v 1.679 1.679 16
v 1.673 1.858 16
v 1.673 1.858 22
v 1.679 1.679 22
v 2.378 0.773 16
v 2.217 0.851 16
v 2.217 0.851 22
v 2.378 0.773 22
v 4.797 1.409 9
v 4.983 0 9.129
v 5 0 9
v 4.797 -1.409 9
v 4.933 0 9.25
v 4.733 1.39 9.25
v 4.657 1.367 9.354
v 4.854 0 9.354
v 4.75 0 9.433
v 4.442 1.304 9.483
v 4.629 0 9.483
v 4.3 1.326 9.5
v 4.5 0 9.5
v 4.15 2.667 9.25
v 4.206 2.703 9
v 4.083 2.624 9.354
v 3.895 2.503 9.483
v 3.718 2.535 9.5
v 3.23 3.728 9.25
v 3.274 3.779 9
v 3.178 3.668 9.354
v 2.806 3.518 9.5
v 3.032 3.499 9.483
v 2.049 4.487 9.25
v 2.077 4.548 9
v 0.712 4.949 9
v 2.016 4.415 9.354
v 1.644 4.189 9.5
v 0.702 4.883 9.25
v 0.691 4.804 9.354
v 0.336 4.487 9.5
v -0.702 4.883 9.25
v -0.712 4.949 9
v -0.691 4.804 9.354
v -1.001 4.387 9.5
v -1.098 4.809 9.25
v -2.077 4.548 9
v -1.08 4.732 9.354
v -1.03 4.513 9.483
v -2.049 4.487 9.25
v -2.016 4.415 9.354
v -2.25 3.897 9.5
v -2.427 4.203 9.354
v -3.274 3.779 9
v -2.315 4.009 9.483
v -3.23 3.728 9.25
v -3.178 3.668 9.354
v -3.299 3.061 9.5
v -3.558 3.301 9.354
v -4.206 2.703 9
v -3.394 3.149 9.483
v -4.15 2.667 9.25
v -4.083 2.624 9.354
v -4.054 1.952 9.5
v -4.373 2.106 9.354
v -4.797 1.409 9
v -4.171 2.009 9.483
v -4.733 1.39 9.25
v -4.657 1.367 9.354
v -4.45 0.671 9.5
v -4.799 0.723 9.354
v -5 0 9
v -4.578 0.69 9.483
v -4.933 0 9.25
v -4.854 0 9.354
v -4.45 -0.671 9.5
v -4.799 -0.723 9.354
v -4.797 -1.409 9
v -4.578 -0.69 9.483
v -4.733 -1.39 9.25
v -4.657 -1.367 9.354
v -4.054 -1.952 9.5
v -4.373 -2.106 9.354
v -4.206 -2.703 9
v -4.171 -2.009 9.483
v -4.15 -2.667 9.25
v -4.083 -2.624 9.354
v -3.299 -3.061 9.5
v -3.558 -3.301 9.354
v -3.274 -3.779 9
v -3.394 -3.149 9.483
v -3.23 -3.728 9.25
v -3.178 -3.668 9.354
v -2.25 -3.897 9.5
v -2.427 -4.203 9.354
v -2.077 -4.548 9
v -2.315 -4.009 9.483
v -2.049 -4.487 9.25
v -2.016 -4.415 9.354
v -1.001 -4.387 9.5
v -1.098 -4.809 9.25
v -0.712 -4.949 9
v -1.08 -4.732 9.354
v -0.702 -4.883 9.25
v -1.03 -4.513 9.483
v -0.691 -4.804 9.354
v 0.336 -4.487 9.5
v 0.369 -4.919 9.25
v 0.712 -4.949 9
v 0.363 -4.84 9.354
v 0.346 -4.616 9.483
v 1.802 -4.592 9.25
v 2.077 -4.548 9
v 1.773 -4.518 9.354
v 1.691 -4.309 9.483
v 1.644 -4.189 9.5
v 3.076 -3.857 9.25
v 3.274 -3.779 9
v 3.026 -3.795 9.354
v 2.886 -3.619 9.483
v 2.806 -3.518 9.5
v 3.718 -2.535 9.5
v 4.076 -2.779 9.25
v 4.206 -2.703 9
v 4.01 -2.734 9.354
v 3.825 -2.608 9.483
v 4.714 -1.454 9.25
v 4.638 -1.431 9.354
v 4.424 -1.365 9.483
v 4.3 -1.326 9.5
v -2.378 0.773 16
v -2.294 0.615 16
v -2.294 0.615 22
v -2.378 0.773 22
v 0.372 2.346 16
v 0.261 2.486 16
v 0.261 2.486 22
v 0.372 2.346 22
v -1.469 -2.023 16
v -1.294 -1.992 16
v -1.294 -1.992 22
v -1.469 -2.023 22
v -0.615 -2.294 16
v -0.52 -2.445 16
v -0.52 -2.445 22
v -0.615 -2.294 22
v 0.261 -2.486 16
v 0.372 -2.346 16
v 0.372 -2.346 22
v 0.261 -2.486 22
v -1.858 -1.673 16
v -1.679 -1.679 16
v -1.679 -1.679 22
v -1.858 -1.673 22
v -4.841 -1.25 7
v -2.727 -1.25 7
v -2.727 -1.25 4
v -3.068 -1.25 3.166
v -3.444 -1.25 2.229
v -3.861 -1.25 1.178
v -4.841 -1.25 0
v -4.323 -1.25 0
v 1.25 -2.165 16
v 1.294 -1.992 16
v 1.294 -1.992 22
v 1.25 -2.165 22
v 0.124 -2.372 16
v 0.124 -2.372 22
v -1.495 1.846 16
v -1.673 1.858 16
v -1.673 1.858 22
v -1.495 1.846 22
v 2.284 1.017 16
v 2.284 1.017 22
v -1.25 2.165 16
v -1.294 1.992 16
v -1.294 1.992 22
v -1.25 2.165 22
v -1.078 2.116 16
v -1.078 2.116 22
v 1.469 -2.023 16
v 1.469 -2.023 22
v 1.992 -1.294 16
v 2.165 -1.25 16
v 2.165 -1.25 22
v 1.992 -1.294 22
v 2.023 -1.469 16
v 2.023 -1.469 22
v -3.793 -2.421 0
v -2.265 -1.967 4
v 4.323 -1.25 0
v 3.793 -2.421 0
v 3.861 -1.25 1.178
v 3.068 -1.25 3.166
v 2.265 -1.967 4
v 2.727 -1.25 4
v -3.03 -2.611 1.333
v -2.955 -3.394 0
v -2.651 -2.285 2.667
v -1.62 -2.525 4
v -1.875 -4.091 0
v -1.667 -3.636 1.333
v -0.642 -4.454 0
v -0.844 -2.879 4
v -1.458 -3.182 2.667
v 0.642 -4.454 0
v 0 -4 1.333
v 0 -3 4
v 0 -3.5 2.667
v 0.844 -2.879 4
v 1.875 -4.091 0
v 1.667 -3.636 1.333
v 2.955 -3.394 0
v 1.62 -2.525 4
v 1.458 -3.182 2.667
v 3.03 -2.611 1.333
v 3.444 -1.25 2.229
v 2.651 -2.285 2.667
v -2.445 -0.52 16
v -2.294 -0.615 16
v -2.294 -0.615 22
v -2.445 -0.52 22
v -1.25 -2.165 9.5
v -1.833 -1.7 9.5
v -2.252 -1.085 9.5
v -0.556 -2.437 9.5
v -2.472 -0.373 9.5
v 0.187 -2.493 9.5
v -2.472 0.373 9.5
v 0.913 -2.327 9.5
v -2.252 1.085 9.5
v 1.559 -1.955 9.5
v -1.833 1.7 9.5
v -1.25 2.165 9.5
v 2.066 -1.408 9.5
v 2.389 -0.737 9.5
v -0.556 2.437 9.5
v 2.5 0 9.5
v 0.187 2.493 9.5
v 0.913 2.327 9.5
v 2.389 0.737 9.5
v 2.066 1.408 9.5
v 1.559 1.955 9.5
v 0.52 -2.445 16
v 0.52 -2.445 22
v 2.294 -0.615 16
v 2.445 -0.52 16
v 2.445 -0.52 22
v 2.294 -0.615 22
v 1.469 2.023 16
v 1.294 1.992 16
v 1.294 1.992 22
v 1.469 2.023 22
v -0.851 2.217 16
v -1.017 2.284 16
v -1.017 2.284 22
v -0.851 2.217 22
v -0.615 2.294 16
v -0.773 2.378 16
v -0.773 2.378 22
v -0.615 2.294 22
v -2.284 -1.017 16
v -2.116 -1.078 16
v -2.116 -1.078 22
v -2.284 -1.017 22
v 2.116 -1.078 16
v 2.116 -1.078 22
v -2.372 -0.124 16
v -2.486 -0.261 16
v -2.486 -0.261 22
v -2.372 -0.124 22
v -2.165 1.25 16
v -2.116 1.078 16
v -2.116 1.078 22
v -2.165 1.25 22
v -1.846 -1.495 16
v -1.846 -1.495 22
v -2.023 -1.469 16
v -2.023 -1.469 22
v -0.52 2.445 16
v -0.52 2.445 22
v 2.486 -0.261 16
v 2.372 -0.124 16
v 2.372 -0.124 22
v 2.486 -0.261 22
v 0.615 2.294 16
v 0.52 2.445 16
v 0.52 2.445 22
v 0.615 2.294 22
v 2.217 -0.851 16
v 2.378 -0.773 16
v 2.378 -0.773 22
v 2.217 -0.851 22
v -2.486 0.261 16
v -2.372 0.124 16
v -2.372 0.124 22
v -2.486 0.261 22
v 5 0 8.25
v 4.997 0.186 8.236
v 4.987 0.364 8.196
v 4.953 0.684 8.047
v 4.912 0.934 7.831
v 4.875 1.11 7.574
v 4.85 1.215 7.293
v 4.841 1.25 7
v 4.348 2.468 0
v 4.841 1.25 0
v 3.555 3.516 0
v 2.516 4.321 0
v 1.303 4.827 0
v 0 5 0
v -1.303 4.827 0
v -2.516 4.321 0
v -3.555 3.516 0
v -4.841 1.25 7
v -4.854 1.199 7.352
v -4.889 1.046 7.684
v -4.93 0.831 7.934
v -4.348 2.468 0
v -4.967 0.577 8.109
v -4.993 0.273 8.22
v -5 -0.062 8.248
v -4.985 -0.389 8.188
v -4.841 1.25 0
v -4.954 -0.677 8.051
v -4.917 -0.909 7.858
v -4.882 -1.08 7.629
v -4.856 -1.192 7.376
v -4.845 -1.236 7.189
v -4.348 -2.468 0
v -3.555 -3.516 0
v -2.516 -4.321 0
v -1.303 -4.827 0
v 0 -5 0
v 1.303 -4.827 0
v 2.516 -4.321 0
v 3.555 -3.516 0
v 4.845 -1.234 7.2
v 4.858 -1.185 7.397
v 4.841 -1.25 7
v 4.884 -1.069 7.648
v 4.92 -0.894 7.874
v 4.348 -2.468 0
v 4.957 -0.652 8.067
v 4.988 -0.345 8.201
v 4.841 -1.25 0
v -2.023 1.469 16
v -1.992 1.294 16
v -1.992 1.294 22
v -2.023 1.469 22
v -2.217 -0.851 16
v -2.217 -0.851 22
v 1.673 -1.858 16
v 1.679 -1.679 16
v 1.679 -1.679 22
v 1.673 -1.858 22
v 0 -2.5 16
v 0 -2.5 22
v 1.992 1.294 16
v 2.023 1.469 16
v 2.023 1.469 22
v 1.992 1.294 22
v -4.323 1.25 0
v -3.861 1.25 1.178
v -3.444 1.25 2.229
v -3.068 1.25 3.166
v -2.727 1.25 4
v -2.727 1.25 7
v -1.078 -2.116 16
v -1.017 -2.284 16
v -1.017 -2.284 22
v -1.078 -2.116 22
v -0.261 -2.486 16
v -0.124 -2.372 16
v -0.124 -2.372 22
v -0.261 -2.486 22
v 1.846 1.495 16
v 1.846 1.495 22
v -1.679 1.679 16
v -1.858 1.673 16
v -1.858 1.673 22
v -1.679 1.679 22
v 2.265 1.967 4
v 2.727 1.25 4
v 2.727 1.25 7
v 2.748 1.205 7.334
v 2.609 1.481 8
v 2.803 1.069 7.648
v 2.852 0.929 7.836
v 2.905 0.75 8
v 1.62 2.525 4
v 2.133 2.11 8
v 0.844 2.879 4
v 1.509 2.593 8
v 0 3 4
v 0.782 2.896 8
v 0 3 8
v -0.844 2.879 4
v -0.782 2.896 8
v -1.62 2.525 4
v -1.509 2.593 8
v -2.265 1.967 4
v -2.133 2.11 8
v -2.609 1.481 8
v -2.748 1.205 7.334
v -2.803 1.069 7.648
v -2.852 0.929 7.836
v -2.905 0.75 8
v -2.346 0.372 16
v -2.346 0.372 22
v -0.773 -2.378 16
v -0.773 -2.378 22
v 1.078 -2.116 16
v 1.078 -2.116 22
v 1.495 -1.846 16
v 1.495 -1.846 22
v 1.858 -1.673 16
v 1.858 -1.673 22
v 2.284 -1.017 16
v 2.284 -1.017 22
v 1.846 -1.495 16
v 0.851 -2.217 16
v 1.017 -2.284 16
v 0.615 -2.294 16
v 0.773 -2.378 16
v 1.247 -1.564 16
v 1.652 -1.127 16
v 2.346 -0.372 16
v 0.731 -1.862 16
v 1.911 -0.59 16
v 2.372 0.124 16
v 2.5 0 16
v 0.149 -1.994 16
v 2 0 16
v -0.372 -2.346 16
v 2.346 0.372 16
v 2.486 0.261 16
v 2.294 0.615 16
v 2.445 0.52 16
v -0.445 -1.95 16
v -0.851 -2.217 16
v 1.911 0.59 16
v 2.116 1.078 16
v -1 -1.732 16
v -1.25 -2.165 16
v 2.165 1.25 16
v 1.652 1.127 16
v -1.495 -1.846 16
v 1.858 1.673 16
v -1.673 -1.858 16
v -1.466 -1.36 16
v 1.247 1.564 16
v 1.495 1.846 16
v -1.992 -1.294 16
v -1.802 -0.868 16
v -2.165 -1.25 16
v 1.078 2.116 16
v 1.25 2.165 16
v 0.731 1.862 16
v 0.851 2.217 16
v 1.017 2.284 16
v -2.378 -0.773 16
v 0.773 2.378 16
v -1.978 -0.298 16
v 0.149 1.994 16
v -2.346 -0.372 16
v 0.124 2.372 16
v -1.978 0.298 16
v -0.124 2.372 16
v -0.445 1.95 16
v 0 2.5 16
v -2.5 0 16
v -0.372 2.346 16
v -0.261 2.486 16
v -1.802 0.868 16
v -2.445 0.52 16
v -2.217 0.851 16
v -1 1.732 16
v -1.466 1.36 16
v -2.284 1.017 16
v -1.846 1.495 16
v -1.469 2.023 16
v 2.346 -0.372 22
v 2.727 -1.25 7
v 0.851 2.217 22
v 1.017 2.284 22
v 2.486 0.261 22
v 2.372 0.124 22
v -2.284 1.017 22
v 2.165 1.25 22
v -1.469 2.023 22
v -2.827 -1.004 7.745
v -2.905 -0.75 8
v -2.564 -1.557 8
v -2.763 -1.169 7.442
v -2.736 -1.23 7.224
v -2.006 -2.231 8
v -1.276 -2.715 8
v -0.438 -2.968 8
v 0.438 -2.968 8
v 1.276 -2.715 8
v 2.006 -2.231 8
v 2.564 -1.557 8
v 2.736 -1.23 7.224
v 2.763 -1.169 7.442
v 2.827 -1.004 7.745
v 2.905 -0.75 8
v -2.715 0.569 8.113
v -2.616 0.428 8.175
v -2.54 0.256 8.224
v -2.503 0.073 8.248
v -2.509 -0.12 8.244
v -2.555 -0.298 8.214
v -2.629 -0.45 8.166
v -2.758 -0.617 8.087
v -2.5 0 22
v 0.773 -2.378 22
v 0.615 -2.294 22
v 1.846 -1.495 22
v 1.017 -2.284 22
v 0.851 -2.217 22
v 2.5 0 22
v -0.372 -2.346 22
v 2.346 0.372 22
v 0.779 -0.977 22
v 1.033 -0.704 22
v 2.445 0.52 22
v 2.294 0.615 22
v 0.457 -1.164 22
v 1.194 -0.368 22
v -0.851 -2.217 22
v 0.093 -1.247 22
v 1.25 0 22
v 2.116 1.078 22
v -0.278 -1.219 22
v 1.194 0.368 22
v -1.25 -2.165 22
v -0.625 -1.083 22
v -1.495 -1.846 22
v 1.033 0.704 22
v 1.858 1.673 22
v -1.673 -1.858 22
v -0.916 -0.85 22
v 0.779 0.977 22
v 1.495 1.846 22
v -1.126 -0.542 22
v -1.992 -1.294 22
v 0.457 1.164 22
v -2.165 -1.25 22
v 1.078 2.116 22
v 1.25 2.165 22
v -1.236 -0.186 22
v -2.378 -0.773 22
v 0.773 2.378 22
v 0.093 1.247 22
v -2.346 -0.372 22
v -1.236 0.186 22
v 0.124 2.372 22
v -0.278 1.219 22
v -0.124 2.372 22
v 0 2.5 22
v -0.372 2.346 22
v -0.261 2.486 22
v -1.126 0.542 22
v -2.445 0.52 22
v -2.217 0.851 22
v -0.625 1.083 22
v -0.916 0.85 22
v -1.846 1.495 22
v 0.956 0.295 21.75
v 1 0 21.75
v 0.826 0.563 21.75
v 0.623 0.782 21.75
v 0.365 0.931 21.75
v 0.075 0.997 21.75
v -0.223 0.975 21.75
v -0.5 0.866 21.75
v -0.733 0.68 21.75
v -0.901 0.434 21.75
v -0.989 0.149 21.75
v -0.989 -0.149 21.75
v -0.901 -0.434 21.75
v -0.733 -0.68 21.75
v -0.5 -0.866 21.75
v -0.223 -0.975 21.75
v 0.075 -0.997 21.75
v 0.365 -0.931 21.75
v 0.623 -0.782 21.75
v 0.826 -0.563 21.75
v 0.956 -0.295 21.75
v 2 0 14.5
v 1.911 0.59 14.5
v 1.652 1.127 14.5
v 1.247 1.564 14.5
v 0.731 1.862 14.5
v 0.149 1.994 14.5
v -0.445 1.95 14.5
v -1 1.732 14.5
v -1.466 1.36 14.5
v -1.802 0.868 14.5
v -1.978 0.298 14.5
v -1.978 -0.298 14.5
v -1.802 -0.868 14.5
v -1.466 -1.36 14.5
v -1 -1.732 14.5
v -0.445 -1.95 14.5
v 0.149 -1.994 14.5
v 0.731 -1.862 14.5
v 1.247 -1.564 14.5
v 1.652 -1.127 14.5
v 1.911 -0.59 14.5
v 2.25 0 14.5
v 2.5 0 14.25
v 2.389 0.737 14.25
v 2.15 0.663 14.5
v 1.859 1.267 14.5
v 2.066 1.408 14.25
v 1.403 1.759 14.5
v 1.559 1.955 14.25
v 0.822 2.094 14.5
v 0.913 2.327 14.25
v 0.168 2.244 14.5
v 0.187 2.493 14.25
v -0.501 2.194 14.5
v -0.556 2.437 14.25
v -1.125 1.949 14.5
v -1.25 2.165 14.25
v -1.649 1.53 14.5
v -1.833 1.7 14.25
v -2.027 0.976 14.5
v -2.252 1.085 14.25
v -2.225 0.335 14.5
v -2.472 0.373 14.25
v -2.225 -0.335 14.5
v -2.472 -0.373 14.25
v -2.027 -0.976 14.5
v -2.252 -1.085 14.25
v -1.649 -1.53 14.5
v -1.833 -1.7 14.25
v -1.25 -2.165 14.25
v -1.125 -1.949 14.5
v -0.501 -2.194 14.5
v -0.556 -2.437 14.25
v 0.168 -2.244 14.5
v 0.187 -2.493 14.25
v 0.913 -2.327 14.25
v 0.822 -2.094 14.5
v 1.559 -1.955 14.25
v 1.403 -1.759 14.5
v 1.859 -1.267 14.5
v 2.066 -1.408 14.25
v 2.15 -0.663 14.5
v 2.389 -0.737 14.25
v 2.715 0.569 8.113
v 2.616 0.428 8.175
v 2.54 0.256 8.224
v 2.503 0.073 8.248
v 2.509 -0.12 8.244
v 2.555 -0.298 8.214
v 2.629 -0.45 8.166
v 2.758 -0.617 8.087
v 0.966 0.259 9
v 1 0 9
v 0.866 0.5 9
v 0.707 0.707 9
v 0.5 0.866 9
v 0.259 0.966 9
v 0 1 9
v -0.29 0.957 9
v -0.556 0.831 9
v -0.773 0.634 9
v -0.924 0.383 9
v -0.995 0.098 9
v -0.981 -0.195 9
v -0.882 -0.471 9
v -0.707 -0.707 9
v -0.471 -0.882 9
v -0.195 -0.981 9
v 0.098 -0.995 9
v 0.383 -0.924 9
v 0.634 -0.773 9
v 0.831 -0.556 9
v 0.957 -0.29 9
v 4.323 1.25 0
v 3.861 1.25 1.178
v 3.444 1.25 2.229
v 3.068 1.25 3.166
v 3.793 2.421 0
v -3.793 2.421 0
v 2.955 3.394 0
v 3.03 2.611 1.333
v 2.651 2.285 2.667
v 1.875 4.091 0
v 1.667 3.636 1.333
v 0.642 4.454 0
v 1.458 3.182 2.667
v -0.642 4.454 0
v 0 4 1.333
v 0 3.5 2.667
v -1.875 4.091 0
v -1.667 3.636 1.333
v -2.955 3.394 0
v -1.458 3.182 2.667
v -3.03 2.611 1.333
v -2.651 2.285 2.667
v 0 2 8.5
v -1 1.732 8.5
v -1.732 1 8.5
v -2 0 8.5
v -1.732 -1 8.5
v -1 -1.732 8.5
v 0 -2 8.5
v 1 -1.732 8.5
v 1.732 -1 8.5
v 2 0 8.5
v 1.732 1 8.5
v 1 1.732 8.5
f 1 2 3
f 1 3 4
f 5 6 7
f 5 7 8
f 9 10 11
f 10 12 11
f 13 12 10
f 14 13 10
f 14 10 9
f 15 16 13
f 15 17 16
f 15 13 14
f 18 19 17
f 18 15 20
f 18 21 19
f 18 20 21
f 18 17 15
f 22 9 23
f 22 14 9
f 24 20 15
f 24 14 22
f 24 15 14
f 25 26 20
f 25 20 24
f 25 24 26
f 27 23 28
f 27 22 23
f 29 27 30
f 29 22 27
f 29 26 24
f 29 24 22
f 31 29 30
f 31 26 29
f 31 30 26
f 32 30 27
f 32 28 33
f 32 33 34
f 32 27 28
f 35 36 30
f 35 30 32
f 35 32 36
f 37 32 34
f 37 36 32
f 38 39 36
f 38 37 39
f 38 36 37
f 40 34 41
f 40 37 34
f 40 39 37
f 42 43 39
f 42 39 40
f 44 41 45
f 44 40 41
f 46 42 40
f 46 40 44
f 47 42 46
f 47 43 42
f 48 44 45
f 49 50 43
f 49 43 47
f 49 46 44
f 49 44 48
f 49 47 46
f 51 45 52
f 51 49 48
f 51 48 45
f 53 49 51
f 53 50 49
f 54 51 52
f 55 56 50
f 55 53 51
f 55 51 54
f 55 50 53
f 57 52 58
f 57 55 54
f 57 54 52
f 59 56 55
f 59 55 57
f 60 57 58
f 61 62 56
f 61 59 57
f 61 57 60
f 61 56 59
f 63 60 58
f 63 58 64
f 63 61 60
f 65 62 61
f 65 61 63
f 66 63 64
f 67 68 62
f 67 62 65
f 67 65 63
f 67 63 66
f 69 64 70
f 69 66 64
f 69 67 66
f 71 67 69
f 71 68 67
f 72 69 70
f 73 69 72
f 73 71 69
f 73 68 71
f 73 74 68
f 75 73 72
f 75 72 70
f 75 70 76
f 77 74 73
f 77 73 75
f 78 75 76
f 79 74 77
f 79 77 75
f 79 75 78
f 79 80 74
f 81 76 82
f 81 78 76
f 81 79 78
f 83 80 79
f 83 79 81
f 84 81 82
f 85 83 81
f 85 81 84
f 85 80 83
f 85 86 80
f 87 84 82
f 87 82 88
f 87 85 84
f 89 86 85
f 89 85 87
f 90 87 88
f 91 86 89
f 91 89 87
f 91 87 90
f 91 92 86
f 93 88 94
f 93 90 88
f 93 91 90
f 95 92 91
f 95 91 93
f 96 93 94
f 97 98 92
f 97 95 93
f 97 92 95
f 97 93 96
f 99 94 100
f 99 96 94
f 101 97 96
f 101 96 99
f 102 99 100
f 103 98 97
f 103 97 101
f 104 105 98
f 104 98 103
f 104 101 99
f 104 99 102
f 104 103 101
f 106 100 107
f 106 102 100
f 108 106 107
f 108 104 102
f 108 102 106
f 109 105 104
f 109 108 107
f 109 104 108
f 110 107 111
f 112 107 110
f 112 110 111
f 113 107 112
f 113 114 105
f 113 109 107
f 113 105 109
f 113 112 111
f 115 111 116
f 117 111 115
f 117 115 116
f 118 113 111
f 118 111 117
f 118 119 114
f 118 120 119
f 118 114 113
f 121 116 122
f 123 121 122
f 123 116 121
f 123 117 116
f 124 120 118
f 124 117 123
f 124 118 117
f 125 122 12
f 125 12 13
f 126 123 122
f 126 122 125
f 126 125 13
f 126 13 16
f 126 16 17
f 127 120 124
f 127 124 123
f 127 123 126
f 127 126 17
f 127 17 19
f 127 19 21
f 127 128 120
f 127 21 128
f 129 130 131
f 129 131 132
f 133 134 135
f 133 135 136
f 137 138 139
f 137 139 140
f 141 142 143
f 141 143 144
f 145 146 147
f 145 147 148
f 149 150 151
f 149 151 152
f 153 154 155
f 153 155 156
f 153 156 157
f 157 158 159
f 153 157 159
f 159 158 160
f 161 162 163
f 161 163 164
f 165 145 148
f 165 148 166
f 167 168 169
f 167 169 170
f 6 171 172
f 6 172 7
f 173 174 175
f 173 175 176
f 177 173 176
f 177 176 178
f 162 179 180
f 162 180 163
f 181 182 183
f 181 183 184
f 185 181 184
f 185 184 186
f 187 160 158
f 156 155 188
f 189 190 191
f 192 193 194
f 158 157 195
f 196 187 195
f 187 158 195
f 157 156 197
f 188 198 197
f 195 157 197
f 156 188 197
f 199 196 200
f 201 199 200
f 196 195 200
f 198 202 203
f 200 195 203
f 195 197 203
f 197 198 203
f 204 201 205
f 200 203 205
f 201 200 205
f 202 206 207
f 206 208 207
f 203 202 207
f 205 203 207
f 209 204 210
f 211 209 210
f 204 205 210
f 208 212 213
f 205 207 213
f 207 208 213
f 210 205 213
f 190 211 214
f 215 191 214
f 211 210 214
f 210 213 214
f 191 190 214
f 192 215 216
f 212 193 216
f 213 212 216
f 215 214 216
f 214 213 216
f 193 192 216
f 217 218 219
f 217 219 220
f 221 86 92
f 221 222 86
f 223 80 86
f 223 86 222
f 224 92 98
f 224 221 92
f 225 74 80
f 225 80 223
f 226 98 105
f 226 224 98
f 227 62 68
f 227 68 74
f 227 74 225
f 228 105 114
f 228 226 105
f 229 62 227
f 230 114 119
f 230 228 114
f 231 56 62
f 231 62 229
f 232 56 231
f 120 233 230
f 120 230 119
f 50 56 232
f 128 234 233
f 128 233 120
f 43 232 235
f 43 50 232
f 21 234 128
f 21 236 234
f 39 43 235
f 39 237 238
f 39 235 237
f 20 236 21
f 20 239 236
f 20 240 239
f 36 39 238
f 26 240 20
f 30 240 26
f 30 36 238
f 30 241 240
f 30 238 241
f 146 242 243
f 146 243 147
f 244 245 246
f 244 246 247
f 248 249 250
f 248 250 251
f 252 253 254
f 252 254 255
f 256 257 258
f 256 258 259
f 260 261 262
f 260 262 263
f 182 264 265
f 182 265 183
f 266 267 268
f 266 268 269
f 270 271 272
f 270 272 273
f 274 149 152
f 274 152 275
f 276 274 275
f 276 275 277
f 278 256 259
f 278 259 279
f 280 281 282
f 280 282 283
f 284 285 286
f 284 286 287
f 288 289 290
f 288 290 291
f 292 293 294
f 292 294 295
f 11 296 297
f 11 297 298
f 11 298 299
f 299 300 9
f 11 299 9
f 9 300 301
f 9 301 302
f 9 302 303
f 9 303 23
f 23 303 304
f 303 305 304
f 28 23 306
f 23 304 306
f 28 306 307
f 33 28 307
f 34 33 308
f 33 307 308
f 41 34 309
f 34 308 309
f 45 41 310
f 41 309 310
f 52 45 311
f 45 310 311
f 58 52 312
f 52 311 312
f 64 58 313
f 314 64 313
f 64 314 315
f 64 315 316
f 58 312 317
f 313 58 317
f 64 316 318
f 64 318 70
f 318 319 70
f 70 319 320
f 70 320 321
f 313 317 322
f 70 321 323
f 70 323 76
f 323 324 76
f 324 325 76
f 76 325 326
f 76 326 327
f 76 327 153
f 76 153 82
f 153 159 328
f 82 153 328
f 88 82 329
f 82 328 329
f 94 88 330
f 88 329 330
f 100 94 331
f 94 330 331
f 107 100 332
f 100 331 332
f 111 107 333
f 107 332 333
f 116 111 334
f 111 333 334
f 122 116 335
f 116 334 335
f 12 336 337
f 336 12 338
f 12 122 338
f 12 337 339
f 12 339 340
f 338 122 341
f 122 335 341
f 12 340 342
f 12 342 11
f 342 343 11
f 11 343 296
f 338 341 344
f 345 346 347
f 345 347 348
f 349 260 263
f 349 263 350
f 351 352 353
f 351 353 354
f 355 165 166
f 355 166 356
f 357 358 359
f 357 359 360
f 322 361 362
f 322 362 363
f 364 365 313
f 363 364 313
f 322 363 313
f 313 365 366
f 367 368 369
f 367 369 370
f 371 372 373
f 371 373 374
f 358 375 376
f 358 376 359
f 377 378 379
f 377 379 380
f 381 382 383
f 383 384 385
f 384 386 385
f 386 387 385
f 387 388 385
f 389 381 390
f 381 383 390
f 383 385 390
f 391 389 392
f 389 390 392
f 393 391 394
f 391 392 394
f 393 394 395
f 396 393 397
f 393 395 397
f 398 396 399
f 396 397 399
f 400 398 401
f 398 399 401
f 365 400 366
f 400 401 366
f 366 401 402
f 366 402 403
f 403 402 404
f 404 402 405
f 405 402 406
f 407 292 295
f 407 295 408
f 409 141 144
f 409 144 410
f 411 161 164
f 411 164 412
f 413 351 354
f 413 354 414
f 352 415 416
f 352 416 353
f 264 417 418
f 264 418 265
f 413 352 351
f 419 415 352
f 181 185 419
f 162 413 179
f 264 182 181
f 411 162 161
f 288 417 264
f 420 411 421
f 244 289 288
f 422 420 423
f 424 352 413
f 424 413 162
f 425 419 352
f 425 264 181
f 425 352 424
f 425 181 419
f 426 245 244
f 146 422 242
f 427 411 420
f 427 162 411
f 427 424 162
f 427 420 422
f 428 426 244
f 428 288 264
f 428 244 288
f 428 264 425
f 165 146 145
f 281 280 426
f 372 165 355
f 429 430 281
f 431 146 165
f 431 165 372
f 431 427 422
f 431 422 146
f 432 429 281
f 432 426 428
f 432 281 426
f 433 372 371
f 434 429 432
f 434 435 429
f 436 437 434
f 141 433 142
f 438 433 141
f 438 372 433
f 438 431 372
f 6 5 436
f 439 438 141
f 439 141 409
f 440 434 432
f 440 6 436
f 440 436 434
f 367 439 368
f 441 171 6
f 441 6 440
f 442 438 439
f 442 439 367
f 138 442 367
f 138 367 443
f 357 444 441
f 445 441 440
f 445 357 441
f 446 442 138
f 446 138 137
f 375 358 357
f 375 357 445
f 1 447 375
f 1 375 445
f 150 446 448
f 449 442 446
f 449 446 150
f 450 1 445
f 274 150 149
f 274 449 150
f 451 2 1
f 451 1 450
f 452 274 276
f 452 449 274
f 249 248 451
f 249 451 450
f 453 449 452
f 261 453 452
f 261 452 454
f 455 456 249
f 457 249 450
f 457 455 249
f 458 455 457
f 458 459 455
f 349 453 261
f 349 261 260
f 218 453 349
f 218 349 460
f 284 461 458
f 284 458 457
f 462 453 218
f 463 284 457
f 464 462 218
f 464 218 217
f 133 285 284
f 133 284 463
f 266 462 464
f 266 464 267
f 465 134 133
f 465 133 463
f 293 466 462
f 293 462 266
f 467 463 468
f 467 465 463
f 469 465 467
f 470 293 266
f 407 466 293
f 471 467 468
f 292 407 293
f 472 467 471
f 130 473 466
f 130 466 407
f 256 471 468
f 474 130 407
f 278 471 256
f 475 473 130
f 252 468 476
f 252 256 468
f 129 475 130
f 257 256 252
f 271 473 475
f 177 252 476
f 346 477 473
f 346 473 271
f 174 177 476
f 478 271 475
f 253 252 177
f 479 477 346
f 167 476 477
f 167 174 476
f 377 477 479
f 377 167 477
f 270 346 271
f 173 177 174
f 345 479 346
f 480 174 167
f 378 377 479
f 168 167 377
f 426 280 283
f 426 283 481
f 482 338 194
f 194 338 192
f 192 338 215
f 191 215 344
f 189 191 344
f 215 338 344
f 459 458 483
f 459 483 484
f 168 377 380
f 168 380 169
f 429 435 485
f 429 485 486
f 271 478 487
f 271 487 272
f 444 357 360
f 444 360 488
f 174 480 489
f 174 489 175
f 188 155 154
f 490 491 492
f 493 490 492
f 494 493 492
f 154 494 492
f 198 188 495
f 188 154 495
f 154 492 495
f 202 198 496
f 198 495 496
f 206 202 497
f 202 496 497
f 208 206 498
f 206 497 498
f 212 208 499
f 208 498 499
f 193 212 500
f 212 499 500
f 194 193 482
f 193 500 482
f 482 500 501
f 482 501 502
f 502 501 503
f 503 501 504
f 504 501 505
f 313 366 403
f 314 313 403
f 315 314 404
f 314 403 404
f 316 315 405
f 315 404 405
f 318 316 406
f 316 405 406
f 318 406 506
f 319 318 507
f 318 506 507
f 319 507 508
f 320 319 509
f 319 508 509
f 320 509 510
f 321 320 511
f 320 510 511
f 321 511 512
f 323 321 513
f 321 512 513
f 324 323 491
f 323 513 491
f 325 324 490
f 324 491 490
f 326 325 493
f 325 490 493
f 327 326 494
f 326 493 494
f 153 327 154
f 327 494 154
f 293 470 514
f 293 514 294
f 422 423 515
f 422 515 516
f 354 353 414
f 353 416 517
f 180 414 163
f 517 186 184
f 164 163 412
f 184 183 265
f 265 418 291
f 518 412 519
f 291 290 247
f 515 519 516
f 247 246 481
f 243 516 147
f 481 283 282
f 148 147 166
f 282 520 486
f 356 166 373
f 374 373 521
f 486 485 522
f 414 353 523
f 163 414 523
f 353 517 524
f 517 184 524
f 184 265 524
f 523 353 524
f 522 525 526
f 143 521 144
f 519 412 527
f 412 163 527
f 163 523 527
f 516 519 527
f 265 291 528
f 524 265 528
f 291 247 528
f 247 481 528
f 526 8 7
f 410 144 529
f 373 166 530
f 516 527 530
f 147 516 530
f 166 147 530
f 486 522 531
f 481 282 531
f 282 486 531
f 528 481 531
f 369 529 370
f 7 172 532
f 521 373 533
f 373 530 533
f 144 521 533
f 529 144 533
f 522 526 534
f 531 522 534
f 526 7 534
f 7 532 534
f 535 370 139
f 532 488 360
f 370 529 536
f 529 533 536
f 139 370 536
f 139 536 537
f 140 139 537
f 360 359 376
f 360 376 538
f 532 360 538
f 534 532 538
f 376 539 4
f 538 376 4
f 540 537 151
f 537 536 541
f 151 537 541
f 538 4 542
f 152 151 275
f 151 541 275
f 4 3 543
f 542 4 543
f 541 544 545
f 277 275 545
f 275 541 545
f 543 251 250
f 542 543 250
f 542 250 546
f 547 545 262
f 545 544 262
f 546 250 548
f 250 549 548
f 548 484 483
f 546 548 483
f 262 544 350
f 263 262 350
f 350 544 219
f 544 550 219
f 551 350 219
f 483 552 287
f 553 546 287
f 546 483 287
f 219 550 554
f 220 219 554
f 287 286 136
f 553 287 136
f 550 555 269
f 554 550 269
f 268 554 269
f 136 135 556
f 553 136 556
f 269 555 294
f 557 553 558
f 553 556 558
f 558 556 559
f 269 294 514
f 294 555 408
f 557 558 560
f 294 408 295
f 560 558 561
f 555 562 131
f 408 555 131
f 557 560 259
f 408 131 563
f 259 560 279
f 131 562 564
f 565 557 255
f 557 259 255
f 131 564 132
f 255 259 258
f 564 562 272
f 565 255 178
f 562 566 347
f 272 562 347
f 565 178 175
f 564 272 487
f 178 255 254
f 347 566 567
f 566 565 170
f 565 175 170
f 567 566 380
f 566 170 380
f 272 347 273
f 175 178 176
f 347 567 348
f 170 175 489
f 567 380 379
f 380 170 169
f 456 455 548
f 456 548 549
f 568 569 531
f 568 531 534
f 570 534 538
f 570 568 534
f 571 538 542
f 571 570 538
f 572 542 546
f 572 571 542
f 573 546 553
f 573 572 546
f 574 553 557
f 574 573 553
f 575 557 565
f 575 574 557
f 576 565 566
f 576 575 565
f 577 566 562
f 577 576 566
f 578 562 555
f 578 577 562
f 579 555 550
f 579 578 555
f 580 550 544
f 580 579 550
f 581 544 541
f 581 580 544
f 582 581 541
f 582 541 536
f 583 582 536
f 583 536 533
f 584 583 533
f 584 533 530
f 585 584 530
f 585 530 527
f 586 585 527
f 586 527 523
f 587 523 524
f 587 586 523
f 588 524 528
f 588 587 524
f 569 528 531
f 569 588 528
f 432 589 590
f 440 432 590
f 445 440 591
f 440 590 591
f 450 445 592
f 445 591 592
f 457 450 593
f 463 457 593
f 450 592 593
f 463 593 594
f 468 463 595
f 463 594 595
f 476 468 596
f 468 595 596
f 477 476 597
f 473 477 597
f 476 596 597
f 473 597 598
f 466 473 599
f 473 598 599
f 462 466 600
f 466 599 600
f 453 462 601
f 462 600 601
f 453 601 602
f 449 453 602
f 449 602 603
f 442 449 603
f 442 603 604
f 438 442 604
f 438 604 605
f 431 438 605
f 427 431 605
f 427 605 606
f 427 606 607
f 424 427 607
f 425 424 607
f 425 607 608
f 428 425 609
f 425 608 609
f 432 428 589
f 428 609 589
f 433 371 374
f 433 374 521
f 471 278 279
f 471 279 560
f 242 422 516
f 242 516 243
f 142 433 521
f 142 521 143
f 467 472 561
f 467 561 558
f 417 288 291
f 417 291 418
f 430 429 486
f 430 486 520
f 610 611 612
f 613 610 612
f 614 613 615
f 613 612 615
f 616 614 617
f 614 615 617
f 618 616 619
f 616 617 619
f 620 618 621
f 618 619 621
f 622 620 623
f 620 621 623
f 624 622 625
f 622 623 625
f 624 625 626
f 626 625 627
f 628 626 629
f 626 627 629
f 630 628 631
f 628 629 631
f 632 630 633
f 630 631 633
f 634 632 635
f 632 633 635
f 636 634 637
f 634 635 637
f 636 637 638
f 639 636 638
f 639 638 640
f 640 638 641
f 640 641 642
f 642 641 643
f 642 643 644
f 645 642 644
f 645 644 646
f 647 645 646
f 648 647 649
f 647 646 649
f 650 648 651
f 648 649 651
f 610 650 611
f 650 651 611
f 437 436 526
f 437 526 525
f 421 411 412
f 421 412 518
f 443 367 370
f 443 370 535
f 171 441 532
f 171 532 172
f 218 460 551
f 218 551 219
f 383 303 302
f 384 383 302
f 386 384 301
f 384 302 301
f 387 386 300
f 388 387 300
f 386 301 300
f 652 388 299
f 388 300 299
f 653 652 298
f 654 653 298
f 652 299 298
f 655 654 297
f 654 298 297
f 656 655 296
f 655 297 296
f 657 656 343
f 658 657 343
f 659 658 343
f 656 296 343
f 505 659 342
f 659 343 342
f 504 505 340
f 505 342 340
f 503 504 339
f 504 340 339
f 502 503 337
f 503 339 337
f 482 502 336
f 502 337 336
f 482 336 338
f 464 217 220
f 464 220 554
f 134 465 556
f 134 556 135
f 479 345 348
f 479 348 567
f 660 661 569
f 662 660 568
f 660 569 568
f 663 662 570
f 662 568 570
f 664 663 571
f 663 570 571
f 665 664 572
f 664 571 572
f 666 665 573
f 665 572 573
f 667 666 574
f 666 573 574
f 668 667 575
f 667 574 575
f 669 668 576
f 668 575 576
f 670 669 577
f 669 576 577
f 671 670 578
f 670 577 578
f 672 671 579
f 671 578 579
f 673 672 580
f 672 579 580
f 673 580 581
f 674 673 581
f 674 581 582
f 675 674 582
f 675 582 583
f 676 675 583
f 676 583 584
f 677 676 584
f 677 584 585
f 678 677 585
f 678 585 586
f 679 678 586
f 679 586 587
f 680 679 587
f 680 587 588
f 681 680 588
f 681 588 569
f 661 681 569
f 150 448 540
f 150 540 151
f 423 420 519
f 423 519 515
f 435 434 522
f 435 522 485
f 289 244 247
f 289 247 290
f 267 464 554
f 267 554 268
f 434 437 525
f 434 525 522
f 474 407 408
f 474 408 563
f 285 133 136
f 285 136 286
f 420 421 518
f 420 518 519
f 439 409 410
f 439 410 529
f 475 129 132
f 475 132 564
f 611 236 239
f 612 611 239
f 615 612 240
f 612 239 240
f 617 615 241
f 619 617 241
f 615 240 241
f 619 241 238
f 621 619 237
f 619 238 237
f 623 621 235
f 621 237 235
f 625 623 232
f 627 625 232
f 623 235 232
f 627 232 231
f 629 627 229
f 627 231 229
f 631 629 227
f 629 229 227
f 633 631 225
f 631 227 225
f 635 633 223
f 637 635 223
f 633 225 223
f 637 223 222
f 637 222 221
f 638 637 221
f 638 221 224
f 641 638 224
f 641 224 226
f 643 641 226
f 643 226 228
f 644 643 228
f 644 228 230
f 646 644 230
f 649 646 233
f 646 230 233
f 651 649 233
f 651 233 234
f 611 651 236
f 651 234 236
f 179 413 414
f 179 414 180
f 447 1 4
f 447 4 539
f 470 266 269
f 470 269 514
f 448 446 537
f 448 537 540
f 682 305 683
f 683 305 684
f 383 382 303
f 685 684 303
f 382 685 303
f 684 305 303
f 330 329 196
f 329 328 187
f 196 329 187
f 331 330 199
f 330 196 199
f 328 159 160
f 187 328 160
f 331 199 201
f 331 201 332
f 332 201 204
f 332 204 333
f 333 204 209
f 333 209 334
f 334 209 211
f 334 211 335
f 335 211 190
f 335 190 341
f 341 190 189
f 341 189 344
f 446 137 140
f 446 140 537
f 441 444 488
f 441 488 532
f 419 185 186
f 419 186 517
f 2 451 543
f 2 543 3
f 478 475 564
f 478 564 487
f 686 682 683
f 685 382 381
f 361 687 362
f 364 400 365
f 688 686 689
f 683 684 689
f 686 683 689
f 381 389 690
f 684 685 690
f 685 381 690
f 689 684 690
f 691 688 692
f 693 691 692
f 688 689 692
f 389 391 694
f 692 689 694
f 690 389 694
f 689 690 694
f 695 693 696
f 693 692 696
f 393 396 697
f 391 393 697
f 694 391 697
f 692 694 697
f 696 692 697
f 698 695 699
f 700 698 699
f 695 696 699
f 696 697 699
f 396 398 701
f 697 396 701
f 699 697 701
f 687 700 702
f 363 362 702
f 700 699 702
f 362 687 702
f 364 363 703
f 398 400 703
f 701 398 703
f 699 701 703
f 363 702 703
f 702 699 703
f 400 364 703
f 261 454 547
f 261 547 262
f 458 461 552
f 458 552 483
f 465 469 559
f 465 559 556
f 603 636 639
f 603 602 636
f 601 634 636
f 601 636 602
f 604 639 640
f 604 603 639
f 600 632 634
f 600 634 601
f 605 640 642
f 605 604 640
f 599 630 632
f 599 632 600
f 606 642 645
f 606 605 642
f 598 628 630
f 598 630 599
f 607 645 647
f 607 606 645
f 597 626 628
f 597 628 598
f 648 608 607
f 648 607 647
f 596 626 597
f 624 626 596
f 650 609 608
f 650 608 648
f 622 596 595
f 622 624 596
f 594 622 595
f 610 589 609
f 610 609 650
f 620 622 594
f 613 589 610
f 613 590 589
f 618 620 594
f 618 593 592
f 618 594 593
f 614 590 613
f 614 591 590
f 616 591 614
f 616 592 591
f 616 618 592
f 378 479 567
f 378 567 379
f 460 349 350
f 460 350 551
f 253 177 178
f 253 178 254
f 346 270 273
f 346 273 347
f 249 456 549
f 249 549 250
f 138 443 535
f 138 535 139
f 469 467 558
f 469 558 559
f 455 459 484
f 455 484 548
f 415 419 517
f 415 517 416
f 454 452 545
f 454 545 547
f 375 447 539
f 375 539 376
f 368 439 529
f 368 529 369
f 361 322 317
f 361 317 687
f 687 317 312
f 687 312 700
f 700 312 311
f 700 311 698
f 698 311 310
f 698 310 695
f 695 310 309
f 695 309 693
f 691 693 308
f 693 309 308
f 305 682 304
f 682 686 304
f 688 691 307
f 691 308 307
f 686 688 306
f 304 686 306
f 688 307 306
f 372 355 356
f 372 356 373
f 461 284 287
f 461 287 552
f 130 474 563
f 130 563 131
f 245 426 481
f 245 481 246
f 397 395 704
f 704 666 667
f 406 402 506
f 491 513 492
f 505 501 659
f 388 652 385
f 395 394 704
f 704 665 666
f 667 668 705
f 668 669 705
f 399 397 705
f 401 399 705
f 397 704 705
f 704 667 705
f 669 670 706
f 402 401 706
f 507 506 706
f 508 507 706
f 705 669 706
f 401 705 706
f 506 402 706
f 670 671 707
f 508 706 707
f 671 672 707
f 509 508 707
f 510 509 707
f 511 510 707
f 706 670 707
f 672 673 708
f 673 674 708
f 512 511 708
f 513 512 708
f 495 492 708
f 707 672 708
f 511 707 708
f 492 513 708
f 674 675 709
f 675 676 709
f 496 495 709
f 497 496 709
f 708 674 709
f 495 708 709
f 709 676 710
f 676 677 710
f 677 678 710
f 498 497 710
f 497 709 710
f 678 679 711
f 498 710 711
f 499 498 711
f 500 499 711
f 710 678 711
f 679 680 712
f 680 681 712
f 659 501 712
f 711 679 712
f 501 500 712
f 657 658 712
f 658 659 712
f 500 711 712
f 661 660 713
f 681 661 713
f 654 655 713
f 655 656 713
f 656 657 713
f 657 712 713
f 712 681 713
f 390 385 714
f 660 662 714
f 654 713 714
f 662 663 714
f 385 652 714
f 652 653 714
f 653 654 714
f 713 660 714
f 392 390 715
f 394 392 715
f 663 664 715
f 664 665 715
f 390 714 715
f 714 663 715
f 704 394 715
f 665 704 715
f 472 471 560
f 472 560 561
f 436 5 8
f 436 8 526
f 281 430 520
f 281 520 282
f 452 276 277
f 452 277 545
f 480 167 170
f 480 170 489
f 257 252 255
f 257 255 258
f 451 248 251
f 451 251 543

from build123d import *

# Parameters (mm, degrees)
ESQUISSE1_R             = 5
BASE_EXTRUSION_DEPTH    = 9.5
ESQUISSE2_R             = 2.5
BOSS_EXTRU_1_DEPTH      = 5
CONG_1_R                = 0.5
ENL_V_MAT_EXTRU_1_DEPTH = 16
ESQUISSE11_R            = 2
BOSS_EXTRU_2_DEPTH      = 1.5
BOSS_EXTRU_3_DEPTH      = 6
ESQUISSE13_R            = 1
ENL_V_MAT_EXTRU_2_DEPTH = 18
CHANFREIN1_SIZE         = 0.25


with BuildPart() as part:
    # Esquisse1 → Base-Extrusion (new body)
    with BuildSketch(Plane.XY):
        Circle(ESQUISSE1_R)
    extrude(amount=BASE_EXTRUSION_DEPTH)

    # Esquisse2 → Boss.-Extru.1 (add)
    with BuildSketch(Plane.XY.offset(9.5)):
        Circle(ESQUISSE2_R)
    extrude(amount=BOSS_EXTRU_1_DEPTH)

    # Congé1
    cong_1_edges = [part.edges().sort_by_distance(p)[0] for p in [
        (-5, 0, 9.5),
    ]]
    fillet(cong_1_edges, radius=CONG_1_R)

    # Esquisse7 → Enlèv. mat.-Extru.1 (cut, symmetric)
    with BuildSketch(Plane(origin=(0, 0, 0), x_dir=(0, 0, -1), z_dir=(1, 0, 0))):
        with BuildLine():
            Line((1, 1.25), (-7, 1.25))
            ThreePointArc((-7, 1.25), (-8.25, 0), (-7, -1.25))
            Line((-7, -1.25), (1, -1.25))
            Line((1, -1.25), (1, 1.25))
        make_face()
    extrude(amount=ENL_V_MAT_EXTRU_1_DEPTH, both=True, mode=Mode.SUBTRACT)

    # Esquisse8 → Enlèvement de matière-Révolution1 (revolve, cut)
    with BuildSketch(Plane(origin=(0, 0, 0), x_dir=(0, 0, -1), z_dir=(1, 0, 0))):
        Polygon((0, 4.5), (-4, 3), (-8, 3), (-9.5, 0), (0, 0), align=None)
    revolve(axis=Axis((0, 0, 0), (0, 0, 1)), mode=Mode.SUBTRACT)

    # Esquisse11 → Boss.-Extru.2 (add)
    with BuildSketch(Plane.XY.offset(14.5)):
        Circle(ESQUISSE11_R)
    extrude(amount=BOSS_EXTRU_2_DEPTH)

    # Esquisse12 → Boss.-Extru.3 (add)
    with BuildSketch(Plane.XY.offset(16)):
        Polygon((-0.124297896, 2.371745145), (0, 2.5), (0.124297896, 2.371745145), (0.261321158, 2.486304738), (0.371531854, 2.345759809), (0.519779227, 2.445369002), (0.614695232, 2.294073837), (0.772542486, 2.377641291), (0.85112388, 2.217253513), (1.016841608, 2.283863644), (1.078227437, 2.116140495), (1.25, 2.165063509), (1.293517708, 1.991842599), (1.469463131, 2.022542486), (1.494635929, 1.845721658), (1.672826516, 1.857862064), (1.679378605, 1.679378605), (1.857862064, 1.672826516), (1.845721658, 1.494635929), (2.022542486, 1.469463131), (1.991842599, 1.293517708), (2.165063509, 1.25), (2.116140495, 1.078227437), (2.283863644, 1.016841608), (2.217253513, 0.85112388), (2.377641291, 0.772542486), (2.294073837, 0.614695232), (2.445369002, 0.519779227), (2.345759809, 0.371531854), (2.486304738, 0.261321158), (2.371745145, 0.124297896), (2.5, 0), (2.371745145, -0.124297896), (2.486304738, -0.261321158), (2.345759809, -0.371531854), (2.445369002, -0.519779227), (2.294073837, -0.614695232), (2.377641291, -0.772542486), (2.217253513, -0.85112388), (2.283863644, -1.016841608), (2.116140495, -1.078227437), (2.165063509, -1.25), (1.991842599, -1.293517708), (2.022542486, -1.469463131), (1.845721658, -1.494635929), (1.857862064, -1.672826516), (1.679378605, -1.679378605), (1.672826516, -1.857862064), (1.494635929, -1.845721658), (1.469463131, -2.022542486), (1.293517708, -1.991842599), (1.25, -2.165063509), (1.078227437, -2.116140495), (1.016841608, -2.283863644), (0.85112388, -2.217253513), (0.772542486, -2.377641291), (0.614695232, -2.294073837), (0.519779227, -2.445369002), (0.371531854, -2.345759809), (0.261321158, -2.486304738), (0.124297896, -2.371745145), (0, -2.5), (-0.124297896, -2.371745145), (-0.261321158, -2.486304738), (-0.371531854, -2.345759809), (-0.519779227, -2.445369002), (-0.614695232, -2.294073837), (-0.772542486, -2.377641291), (-0.85112388, -2.217253513), (-1.016841608, -2.283863644), (-1.078227437, -2.116140495), (-1.25, -2.165063509), (-1.293517708, -1.991842599), (-1.469463131, -2.022542486), (-1.494635929, -1.845721658), (-1.672826516, -1.857862064), (-1.679378605, -1.679378605), (-1.857862064, -1.672826516), (-1.845721658, -1.494635929), (-2.022542486, -1.469463131), (-1.991842599, -1.293517708), (-2.165063509, -1.25), (-2.116140495, -1.078227437), (-2.283863644, -1.016841608), (-2.217253513, -0.85112388), (-2.377641291, -0.772542486), (-2.294073837, -0.614695232), (-2.445369002, -0.519779227), (-2.345759809, -0.371531854), (-2.486304738, -0.261321158), (-2.371745145, -0.124297896), (-2.5, 0), (-2.371745145, 0.124297896), (-2.486304738, 0.261321158), (-2.345759809, 0.371531854), (-2.445369002, 0.519779227), (-2.294073837, 0.614695232), (-2.377641291, 0.772542486), (-2.217253513, 0.85112388), (-2.283863644, 1.016841608), (-2.116140495, 1.078227437), (-2.165063509, 1.25), (-1.991842599, 1.293517708), (-2.022542486, 1.469463131), (-1.845721658, 1.494635929), (-1.857862064, 1.672826516), (-1.679378605, 1.679378605), (-1.672826516, 1.857862064), (-1.494635929, 1.845721658), (-1.469463131, 2.022542486), (-1.293517708, 1.991842599), (-1.25, 2.165063509), (-1.078227437, 2.116140495), (-1.016841608, 2.283863644), (-0.85112388, 2.217253513), (-0.772542486, 2.377641291), (-0.614695232, 2.294073837), (-0.519779227, 2.445369002), (-0.371531854, 2.345759809), (-0.261321158, 2.486304738), align=None)
    extrude(amount=BOSS_EXTRU_3_DEPTH)

    # Esquisse13 → Enlèv. mat.-Extru.2 (cut)
    with BuildSketch(Plane.XY.offset(22)):
        Circle(ESQUISSE13_R)
    extrude(amount=-ENL_V_MAT_EXTRU_2_DEPTH, mode=Mode.SUBTRACT)

    # Chanfrein1
    chanfrein1_edges = [part.edges().sort_by_distance(p)[0] for p in [
        (-1, 0, 22),
        (-2.5, 0, 14.5),
    ]]
    chamfer(chanfrein1_edges, length=CHANFREIN1_SIZE)


solid = part.part
